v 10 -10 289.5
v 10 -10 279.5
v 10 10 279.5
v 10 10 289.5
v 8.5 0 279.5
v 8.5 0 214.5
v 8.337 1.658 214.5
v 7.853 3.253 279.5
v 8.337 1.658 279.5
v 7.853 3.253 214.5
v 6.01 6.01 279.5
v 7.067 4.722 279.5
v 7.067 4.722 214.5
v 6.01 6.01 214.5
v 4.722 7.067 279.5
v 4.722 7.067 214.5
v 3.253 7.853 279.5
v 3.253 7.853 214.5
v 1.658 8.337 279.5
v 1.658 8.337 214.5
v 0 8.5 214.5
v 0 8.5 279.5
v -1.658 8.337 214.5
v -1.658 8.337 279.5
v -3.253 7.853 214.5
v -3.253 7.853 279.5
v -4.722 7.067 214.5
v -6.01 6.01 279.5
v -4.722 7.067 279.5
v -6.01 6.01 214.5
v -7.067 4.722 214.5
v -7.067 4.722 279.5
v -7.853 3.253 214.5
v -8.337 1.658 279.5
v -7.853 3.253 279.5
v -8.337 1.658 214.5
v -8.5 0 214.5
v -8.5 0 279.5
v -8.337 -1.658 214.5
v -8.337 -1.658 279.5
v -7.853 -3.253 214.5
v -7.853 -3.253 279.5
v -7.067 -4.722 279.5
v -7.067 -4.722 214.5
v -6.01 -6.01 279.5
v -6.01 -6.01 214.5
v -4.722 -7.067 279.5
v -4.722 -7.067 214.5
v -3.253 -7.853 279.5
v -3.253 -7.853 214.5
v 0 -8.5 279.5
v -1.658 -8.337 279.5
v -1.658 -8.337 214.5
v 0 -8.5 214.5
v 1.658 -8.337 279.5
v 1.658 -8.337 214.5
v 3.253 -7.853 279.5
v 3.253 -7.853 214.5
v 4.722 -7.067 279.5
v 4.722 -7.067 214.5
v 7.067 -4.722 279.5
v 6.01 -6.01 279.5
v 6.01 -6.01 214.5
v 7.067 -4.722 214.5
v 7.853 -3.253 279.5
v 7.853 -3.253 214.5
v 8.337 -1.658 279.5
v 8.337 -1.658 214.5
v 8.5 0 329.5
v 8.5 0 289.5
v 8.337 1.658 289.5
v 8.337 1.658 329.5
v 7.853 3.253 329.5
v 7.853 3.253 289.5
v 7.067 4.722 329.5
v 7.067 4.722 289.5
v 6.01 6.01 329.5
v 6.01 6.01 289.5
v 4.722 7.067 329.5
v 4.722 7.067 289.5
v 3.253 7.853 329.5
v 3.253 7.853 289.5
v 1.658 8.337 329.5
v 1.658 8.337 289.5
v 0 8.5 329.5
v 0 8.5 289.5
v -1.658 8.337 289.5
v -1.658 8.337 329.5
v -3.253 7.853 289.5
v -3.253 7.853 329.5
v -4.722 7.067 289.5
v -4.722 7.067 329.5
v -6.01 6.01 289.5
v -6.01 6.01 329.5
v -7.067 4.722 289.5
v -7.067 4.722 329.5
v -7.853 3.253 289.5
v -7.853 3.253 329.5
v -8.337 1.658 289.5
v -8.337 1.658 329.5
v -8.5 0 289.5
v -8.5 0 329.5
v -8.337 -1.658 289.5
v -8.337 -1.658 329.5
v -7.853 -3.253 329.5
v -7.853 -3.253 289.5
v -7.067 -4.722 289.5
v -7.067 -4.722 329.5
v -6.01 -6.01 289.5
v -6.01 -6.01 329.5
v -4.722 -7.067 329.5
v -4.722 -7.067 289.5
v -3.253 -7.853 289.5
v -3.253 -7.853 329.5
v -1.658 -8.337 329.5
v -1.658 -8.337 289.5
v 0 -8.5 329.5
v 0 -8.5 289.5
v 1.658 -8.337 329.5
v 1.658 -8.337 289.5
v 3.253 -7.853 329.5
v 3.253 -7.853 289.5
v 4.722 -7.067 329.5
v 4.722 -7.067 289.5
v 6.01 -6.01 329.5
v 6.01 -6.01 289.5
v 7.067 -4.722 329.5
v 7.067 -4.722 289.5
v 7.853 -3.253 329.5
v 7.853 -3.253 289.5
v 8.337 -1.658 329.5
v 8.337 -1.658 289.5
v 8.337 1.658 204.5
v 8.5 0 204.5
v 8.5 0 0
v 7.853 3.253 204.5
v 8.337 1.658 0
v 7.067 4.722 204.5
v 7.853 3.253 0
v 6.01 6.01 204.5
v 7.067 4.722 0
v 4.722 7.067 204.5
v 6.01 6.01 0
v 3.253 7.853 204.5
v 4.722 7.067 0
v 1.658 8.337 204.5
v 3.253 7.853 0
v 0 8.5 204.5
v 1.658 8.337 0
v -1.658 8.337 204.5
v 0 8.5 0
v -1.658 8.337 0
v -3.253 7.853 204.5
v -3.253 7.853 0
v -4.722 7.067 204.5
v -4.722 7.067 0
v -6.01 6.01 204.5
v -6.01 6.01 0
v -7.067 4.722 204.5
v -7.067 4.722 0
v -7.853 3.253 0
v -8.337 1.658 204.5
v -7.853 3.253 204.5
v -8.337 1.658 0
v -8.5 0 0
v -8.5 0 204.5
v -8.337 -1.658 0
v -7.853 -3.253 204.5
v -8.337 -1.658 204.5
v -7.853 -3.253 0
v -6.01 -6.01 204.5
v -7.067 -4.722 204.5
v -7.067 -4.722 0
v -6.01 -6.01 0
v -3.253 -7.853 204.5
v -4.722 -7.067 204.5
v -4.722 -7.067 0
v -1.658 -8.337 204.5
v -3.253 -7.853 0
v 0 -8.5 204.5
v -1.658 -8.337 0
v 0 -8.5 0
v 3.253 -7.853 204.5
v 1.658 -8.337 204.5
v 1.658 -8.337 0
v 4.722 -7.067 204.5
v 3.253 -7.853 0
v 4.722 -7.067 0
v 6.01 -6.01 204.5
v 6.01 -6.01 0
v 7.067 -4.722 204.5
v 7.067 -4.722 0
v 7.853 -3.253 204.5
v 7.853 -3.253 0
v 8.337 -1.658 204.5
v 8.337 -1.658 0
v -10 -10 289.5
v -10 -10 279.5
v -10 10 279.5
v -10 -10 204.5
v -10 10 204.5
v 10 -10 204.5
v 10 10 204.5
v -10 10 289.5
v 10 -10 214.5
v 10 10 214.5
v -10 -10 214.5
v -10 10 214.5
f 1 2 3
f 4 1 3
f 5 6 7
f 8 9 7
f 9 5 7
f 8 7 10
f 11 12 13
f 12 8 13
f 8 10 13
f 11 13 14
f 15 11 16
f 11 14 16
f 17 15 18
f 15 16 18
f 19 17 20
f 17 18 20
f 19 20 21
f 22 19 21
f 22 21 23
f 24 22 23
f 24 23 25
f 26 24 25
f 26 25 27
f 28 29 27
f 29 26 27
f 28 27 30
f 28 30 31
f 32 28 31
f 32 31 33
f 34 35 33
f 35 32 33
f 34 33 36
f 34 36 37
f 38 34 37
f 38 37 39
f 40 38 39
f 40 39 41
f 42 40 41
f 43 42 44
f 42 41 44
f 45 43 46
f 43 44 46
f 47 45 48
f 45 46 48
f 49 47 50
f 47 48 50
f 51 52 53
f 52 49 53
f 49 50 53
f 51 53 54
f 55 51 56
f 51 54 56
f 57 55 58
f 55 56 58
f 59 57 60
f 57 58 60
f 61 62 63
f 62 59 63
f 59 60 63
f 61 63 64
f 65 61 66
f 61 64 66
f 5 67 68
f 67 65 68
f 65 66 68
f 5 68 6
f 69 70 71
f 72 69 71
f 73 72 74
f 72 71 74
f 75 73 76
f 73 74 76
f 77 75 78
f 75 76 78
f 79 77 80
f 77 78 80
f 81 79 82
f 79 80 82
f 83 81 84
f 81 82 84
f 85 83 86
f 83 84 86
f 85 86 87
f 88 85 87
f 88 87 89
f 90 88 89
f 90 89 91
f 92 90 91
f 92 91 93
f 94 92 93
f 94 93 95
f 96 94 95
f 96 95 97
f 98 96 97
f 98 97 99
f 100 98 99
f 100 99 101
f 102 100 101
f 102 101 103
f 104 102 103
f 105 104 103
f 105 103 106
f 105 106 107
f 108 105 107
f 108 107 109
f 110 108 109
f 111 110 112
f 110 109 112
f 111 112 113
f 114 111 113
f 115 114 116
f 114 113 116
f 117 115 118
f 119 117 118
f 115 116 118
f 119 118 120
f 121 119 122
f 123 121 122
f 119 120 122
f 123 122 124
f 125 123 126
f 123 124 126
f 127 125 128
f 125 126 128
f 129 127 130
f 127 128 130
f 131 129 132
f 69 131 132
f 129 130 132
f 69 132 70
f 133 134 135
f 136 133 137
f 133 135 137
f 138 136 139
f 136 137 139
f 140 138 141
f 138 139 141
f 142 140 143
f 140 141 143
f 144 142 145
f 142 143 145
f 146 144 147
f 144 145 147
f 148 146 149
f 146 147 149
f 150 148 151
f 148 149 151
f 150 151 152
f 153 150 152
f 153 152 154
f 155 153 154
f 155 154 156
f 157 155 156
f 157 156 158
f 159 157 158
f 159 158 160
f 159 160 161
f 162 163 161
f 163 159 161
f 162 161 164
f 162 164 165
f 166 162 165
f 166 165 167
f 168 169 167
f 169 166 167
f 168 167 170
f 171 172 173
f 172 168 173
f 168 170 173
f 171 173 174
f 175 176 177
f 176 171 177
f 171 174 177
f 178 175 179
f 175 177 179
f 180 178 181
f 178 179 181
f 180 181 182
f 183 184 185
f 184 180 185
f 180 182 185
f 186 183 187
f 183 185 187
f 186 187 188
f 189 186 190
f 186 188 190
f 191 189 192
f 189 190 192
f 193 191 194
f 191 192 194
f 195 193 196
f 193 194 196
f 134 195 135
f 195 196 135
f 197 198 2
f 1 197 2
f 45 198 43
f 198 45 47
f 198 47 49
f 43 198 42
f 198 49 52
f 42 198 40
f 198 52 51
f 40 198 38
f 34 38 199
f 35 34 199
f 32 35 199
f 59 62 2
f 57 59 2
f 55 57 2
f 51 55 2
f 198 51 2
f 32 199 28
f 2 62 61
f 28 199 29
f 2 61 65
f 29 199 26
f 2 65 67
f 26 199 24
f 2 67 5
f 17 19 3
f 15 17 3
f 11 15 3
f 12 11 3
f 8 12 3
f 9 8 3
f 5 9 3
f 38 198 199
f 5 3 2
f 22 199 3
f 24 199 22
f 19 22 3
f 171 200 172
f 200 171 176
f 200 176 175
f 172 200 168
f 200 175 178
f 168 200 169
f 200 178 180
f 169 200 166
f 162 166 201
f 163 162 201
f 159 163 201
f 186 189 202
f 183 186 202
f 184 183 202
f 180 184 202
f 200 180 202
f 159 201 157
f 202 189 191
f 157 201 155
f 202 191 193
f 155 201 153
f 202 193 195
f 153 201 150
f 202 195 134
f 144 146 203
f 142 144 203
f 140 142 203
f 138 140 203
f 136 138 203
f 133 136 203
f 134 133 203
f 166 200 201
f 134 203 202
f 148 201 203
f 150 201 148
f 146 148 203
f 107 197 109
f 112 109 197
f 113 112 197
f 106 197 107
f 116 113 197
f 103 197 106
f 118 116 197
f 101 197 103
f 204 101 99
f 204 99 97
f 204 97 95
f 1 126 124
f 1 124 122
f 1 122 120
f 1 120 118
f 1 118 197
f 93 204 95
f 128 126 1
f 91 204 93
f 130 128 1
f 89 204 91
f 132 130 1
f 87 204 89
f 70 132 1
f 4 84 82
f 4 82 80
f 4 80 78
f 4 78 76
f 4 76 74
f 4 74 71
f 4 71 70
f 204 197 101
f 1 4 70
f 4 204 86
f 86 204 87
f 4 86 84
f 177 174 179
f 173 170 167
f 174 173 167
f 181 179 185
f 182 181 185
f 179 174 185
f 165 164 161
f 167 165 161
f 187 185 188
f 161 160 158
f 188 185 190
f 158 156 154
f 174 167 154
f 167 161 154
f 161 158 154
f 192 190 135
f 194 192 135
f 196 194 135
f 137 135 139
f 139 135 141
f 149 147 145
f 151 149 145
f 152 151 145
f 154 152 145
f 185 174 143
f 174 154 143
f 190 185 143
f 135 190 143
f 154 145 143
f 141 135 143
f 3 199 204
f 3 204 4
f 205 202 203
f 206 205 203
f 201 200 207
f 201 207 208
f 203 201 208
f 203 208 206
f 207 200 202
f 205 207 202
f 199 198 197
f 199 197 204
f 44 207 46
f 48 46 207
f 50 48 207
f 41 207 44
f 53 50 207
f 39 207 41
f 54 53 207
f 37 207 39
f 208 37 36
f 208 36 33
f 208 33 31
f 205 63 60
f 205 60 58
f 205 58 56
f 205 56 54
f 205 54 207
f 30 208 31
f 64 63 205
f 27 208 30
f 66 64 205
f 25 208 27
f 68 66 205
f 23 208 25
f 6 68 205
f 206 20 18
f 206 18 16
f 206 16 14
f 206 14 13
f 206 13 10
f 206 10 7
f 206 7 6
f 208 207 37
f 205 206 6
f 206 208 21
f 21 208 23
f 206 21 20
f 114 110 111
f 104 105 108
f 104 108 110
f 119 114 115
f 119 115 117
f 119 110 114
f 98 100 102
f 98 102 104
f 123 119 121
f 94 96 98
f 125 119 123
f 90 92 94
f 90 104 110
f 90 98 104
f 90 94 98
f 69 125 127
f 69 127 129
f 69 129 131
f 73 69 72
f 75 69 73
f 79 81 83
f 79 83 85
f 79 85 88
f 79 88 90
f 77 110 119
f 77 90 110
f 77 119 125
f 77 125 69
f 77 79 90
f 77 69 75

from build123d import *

# Parameters (mm, degrees)
SKETCH1_R           = 8.5
BOSS_EXTRUDE1_DEPTH = 329.5
SKETCH2_W           = 20
SKETCH2_H           = 20
BOSS_EXTRUDE2_DEPTH = 10
SKETCH3_W           = 20
SKETCH3_H           = 20
BOSS_EXTRUDE3_DEPTH = 10


with BuildPart() as part:
    # Sketch1 → Boss-Extrude1 (new body)
    with BuildSketch(Plane.XY):
        Circle(SKETCH1_R)
    extrude(amount=BOSS_EXTRUDE1_DEPTH)

    # Sketch2 → Boss-Extrude2 (add)
    with BuildSketch(Plane.XY.offset(279.5)):
        Rectangle(SKETCH2_W, SKETCH2_H)
    extrude(amount=BOSS_EXTRUDE2_DEPTH)

    # Sketch3 → Boss-Extrude3 (add)
    with BuildSketch(Plane.XY.offset(204.5)):
        Rectangle(SKETCH3_W, SKETCH3_H)
    extrude(amount=BOSS_EXTRUDE3_DEPTH)


solid = part.part
